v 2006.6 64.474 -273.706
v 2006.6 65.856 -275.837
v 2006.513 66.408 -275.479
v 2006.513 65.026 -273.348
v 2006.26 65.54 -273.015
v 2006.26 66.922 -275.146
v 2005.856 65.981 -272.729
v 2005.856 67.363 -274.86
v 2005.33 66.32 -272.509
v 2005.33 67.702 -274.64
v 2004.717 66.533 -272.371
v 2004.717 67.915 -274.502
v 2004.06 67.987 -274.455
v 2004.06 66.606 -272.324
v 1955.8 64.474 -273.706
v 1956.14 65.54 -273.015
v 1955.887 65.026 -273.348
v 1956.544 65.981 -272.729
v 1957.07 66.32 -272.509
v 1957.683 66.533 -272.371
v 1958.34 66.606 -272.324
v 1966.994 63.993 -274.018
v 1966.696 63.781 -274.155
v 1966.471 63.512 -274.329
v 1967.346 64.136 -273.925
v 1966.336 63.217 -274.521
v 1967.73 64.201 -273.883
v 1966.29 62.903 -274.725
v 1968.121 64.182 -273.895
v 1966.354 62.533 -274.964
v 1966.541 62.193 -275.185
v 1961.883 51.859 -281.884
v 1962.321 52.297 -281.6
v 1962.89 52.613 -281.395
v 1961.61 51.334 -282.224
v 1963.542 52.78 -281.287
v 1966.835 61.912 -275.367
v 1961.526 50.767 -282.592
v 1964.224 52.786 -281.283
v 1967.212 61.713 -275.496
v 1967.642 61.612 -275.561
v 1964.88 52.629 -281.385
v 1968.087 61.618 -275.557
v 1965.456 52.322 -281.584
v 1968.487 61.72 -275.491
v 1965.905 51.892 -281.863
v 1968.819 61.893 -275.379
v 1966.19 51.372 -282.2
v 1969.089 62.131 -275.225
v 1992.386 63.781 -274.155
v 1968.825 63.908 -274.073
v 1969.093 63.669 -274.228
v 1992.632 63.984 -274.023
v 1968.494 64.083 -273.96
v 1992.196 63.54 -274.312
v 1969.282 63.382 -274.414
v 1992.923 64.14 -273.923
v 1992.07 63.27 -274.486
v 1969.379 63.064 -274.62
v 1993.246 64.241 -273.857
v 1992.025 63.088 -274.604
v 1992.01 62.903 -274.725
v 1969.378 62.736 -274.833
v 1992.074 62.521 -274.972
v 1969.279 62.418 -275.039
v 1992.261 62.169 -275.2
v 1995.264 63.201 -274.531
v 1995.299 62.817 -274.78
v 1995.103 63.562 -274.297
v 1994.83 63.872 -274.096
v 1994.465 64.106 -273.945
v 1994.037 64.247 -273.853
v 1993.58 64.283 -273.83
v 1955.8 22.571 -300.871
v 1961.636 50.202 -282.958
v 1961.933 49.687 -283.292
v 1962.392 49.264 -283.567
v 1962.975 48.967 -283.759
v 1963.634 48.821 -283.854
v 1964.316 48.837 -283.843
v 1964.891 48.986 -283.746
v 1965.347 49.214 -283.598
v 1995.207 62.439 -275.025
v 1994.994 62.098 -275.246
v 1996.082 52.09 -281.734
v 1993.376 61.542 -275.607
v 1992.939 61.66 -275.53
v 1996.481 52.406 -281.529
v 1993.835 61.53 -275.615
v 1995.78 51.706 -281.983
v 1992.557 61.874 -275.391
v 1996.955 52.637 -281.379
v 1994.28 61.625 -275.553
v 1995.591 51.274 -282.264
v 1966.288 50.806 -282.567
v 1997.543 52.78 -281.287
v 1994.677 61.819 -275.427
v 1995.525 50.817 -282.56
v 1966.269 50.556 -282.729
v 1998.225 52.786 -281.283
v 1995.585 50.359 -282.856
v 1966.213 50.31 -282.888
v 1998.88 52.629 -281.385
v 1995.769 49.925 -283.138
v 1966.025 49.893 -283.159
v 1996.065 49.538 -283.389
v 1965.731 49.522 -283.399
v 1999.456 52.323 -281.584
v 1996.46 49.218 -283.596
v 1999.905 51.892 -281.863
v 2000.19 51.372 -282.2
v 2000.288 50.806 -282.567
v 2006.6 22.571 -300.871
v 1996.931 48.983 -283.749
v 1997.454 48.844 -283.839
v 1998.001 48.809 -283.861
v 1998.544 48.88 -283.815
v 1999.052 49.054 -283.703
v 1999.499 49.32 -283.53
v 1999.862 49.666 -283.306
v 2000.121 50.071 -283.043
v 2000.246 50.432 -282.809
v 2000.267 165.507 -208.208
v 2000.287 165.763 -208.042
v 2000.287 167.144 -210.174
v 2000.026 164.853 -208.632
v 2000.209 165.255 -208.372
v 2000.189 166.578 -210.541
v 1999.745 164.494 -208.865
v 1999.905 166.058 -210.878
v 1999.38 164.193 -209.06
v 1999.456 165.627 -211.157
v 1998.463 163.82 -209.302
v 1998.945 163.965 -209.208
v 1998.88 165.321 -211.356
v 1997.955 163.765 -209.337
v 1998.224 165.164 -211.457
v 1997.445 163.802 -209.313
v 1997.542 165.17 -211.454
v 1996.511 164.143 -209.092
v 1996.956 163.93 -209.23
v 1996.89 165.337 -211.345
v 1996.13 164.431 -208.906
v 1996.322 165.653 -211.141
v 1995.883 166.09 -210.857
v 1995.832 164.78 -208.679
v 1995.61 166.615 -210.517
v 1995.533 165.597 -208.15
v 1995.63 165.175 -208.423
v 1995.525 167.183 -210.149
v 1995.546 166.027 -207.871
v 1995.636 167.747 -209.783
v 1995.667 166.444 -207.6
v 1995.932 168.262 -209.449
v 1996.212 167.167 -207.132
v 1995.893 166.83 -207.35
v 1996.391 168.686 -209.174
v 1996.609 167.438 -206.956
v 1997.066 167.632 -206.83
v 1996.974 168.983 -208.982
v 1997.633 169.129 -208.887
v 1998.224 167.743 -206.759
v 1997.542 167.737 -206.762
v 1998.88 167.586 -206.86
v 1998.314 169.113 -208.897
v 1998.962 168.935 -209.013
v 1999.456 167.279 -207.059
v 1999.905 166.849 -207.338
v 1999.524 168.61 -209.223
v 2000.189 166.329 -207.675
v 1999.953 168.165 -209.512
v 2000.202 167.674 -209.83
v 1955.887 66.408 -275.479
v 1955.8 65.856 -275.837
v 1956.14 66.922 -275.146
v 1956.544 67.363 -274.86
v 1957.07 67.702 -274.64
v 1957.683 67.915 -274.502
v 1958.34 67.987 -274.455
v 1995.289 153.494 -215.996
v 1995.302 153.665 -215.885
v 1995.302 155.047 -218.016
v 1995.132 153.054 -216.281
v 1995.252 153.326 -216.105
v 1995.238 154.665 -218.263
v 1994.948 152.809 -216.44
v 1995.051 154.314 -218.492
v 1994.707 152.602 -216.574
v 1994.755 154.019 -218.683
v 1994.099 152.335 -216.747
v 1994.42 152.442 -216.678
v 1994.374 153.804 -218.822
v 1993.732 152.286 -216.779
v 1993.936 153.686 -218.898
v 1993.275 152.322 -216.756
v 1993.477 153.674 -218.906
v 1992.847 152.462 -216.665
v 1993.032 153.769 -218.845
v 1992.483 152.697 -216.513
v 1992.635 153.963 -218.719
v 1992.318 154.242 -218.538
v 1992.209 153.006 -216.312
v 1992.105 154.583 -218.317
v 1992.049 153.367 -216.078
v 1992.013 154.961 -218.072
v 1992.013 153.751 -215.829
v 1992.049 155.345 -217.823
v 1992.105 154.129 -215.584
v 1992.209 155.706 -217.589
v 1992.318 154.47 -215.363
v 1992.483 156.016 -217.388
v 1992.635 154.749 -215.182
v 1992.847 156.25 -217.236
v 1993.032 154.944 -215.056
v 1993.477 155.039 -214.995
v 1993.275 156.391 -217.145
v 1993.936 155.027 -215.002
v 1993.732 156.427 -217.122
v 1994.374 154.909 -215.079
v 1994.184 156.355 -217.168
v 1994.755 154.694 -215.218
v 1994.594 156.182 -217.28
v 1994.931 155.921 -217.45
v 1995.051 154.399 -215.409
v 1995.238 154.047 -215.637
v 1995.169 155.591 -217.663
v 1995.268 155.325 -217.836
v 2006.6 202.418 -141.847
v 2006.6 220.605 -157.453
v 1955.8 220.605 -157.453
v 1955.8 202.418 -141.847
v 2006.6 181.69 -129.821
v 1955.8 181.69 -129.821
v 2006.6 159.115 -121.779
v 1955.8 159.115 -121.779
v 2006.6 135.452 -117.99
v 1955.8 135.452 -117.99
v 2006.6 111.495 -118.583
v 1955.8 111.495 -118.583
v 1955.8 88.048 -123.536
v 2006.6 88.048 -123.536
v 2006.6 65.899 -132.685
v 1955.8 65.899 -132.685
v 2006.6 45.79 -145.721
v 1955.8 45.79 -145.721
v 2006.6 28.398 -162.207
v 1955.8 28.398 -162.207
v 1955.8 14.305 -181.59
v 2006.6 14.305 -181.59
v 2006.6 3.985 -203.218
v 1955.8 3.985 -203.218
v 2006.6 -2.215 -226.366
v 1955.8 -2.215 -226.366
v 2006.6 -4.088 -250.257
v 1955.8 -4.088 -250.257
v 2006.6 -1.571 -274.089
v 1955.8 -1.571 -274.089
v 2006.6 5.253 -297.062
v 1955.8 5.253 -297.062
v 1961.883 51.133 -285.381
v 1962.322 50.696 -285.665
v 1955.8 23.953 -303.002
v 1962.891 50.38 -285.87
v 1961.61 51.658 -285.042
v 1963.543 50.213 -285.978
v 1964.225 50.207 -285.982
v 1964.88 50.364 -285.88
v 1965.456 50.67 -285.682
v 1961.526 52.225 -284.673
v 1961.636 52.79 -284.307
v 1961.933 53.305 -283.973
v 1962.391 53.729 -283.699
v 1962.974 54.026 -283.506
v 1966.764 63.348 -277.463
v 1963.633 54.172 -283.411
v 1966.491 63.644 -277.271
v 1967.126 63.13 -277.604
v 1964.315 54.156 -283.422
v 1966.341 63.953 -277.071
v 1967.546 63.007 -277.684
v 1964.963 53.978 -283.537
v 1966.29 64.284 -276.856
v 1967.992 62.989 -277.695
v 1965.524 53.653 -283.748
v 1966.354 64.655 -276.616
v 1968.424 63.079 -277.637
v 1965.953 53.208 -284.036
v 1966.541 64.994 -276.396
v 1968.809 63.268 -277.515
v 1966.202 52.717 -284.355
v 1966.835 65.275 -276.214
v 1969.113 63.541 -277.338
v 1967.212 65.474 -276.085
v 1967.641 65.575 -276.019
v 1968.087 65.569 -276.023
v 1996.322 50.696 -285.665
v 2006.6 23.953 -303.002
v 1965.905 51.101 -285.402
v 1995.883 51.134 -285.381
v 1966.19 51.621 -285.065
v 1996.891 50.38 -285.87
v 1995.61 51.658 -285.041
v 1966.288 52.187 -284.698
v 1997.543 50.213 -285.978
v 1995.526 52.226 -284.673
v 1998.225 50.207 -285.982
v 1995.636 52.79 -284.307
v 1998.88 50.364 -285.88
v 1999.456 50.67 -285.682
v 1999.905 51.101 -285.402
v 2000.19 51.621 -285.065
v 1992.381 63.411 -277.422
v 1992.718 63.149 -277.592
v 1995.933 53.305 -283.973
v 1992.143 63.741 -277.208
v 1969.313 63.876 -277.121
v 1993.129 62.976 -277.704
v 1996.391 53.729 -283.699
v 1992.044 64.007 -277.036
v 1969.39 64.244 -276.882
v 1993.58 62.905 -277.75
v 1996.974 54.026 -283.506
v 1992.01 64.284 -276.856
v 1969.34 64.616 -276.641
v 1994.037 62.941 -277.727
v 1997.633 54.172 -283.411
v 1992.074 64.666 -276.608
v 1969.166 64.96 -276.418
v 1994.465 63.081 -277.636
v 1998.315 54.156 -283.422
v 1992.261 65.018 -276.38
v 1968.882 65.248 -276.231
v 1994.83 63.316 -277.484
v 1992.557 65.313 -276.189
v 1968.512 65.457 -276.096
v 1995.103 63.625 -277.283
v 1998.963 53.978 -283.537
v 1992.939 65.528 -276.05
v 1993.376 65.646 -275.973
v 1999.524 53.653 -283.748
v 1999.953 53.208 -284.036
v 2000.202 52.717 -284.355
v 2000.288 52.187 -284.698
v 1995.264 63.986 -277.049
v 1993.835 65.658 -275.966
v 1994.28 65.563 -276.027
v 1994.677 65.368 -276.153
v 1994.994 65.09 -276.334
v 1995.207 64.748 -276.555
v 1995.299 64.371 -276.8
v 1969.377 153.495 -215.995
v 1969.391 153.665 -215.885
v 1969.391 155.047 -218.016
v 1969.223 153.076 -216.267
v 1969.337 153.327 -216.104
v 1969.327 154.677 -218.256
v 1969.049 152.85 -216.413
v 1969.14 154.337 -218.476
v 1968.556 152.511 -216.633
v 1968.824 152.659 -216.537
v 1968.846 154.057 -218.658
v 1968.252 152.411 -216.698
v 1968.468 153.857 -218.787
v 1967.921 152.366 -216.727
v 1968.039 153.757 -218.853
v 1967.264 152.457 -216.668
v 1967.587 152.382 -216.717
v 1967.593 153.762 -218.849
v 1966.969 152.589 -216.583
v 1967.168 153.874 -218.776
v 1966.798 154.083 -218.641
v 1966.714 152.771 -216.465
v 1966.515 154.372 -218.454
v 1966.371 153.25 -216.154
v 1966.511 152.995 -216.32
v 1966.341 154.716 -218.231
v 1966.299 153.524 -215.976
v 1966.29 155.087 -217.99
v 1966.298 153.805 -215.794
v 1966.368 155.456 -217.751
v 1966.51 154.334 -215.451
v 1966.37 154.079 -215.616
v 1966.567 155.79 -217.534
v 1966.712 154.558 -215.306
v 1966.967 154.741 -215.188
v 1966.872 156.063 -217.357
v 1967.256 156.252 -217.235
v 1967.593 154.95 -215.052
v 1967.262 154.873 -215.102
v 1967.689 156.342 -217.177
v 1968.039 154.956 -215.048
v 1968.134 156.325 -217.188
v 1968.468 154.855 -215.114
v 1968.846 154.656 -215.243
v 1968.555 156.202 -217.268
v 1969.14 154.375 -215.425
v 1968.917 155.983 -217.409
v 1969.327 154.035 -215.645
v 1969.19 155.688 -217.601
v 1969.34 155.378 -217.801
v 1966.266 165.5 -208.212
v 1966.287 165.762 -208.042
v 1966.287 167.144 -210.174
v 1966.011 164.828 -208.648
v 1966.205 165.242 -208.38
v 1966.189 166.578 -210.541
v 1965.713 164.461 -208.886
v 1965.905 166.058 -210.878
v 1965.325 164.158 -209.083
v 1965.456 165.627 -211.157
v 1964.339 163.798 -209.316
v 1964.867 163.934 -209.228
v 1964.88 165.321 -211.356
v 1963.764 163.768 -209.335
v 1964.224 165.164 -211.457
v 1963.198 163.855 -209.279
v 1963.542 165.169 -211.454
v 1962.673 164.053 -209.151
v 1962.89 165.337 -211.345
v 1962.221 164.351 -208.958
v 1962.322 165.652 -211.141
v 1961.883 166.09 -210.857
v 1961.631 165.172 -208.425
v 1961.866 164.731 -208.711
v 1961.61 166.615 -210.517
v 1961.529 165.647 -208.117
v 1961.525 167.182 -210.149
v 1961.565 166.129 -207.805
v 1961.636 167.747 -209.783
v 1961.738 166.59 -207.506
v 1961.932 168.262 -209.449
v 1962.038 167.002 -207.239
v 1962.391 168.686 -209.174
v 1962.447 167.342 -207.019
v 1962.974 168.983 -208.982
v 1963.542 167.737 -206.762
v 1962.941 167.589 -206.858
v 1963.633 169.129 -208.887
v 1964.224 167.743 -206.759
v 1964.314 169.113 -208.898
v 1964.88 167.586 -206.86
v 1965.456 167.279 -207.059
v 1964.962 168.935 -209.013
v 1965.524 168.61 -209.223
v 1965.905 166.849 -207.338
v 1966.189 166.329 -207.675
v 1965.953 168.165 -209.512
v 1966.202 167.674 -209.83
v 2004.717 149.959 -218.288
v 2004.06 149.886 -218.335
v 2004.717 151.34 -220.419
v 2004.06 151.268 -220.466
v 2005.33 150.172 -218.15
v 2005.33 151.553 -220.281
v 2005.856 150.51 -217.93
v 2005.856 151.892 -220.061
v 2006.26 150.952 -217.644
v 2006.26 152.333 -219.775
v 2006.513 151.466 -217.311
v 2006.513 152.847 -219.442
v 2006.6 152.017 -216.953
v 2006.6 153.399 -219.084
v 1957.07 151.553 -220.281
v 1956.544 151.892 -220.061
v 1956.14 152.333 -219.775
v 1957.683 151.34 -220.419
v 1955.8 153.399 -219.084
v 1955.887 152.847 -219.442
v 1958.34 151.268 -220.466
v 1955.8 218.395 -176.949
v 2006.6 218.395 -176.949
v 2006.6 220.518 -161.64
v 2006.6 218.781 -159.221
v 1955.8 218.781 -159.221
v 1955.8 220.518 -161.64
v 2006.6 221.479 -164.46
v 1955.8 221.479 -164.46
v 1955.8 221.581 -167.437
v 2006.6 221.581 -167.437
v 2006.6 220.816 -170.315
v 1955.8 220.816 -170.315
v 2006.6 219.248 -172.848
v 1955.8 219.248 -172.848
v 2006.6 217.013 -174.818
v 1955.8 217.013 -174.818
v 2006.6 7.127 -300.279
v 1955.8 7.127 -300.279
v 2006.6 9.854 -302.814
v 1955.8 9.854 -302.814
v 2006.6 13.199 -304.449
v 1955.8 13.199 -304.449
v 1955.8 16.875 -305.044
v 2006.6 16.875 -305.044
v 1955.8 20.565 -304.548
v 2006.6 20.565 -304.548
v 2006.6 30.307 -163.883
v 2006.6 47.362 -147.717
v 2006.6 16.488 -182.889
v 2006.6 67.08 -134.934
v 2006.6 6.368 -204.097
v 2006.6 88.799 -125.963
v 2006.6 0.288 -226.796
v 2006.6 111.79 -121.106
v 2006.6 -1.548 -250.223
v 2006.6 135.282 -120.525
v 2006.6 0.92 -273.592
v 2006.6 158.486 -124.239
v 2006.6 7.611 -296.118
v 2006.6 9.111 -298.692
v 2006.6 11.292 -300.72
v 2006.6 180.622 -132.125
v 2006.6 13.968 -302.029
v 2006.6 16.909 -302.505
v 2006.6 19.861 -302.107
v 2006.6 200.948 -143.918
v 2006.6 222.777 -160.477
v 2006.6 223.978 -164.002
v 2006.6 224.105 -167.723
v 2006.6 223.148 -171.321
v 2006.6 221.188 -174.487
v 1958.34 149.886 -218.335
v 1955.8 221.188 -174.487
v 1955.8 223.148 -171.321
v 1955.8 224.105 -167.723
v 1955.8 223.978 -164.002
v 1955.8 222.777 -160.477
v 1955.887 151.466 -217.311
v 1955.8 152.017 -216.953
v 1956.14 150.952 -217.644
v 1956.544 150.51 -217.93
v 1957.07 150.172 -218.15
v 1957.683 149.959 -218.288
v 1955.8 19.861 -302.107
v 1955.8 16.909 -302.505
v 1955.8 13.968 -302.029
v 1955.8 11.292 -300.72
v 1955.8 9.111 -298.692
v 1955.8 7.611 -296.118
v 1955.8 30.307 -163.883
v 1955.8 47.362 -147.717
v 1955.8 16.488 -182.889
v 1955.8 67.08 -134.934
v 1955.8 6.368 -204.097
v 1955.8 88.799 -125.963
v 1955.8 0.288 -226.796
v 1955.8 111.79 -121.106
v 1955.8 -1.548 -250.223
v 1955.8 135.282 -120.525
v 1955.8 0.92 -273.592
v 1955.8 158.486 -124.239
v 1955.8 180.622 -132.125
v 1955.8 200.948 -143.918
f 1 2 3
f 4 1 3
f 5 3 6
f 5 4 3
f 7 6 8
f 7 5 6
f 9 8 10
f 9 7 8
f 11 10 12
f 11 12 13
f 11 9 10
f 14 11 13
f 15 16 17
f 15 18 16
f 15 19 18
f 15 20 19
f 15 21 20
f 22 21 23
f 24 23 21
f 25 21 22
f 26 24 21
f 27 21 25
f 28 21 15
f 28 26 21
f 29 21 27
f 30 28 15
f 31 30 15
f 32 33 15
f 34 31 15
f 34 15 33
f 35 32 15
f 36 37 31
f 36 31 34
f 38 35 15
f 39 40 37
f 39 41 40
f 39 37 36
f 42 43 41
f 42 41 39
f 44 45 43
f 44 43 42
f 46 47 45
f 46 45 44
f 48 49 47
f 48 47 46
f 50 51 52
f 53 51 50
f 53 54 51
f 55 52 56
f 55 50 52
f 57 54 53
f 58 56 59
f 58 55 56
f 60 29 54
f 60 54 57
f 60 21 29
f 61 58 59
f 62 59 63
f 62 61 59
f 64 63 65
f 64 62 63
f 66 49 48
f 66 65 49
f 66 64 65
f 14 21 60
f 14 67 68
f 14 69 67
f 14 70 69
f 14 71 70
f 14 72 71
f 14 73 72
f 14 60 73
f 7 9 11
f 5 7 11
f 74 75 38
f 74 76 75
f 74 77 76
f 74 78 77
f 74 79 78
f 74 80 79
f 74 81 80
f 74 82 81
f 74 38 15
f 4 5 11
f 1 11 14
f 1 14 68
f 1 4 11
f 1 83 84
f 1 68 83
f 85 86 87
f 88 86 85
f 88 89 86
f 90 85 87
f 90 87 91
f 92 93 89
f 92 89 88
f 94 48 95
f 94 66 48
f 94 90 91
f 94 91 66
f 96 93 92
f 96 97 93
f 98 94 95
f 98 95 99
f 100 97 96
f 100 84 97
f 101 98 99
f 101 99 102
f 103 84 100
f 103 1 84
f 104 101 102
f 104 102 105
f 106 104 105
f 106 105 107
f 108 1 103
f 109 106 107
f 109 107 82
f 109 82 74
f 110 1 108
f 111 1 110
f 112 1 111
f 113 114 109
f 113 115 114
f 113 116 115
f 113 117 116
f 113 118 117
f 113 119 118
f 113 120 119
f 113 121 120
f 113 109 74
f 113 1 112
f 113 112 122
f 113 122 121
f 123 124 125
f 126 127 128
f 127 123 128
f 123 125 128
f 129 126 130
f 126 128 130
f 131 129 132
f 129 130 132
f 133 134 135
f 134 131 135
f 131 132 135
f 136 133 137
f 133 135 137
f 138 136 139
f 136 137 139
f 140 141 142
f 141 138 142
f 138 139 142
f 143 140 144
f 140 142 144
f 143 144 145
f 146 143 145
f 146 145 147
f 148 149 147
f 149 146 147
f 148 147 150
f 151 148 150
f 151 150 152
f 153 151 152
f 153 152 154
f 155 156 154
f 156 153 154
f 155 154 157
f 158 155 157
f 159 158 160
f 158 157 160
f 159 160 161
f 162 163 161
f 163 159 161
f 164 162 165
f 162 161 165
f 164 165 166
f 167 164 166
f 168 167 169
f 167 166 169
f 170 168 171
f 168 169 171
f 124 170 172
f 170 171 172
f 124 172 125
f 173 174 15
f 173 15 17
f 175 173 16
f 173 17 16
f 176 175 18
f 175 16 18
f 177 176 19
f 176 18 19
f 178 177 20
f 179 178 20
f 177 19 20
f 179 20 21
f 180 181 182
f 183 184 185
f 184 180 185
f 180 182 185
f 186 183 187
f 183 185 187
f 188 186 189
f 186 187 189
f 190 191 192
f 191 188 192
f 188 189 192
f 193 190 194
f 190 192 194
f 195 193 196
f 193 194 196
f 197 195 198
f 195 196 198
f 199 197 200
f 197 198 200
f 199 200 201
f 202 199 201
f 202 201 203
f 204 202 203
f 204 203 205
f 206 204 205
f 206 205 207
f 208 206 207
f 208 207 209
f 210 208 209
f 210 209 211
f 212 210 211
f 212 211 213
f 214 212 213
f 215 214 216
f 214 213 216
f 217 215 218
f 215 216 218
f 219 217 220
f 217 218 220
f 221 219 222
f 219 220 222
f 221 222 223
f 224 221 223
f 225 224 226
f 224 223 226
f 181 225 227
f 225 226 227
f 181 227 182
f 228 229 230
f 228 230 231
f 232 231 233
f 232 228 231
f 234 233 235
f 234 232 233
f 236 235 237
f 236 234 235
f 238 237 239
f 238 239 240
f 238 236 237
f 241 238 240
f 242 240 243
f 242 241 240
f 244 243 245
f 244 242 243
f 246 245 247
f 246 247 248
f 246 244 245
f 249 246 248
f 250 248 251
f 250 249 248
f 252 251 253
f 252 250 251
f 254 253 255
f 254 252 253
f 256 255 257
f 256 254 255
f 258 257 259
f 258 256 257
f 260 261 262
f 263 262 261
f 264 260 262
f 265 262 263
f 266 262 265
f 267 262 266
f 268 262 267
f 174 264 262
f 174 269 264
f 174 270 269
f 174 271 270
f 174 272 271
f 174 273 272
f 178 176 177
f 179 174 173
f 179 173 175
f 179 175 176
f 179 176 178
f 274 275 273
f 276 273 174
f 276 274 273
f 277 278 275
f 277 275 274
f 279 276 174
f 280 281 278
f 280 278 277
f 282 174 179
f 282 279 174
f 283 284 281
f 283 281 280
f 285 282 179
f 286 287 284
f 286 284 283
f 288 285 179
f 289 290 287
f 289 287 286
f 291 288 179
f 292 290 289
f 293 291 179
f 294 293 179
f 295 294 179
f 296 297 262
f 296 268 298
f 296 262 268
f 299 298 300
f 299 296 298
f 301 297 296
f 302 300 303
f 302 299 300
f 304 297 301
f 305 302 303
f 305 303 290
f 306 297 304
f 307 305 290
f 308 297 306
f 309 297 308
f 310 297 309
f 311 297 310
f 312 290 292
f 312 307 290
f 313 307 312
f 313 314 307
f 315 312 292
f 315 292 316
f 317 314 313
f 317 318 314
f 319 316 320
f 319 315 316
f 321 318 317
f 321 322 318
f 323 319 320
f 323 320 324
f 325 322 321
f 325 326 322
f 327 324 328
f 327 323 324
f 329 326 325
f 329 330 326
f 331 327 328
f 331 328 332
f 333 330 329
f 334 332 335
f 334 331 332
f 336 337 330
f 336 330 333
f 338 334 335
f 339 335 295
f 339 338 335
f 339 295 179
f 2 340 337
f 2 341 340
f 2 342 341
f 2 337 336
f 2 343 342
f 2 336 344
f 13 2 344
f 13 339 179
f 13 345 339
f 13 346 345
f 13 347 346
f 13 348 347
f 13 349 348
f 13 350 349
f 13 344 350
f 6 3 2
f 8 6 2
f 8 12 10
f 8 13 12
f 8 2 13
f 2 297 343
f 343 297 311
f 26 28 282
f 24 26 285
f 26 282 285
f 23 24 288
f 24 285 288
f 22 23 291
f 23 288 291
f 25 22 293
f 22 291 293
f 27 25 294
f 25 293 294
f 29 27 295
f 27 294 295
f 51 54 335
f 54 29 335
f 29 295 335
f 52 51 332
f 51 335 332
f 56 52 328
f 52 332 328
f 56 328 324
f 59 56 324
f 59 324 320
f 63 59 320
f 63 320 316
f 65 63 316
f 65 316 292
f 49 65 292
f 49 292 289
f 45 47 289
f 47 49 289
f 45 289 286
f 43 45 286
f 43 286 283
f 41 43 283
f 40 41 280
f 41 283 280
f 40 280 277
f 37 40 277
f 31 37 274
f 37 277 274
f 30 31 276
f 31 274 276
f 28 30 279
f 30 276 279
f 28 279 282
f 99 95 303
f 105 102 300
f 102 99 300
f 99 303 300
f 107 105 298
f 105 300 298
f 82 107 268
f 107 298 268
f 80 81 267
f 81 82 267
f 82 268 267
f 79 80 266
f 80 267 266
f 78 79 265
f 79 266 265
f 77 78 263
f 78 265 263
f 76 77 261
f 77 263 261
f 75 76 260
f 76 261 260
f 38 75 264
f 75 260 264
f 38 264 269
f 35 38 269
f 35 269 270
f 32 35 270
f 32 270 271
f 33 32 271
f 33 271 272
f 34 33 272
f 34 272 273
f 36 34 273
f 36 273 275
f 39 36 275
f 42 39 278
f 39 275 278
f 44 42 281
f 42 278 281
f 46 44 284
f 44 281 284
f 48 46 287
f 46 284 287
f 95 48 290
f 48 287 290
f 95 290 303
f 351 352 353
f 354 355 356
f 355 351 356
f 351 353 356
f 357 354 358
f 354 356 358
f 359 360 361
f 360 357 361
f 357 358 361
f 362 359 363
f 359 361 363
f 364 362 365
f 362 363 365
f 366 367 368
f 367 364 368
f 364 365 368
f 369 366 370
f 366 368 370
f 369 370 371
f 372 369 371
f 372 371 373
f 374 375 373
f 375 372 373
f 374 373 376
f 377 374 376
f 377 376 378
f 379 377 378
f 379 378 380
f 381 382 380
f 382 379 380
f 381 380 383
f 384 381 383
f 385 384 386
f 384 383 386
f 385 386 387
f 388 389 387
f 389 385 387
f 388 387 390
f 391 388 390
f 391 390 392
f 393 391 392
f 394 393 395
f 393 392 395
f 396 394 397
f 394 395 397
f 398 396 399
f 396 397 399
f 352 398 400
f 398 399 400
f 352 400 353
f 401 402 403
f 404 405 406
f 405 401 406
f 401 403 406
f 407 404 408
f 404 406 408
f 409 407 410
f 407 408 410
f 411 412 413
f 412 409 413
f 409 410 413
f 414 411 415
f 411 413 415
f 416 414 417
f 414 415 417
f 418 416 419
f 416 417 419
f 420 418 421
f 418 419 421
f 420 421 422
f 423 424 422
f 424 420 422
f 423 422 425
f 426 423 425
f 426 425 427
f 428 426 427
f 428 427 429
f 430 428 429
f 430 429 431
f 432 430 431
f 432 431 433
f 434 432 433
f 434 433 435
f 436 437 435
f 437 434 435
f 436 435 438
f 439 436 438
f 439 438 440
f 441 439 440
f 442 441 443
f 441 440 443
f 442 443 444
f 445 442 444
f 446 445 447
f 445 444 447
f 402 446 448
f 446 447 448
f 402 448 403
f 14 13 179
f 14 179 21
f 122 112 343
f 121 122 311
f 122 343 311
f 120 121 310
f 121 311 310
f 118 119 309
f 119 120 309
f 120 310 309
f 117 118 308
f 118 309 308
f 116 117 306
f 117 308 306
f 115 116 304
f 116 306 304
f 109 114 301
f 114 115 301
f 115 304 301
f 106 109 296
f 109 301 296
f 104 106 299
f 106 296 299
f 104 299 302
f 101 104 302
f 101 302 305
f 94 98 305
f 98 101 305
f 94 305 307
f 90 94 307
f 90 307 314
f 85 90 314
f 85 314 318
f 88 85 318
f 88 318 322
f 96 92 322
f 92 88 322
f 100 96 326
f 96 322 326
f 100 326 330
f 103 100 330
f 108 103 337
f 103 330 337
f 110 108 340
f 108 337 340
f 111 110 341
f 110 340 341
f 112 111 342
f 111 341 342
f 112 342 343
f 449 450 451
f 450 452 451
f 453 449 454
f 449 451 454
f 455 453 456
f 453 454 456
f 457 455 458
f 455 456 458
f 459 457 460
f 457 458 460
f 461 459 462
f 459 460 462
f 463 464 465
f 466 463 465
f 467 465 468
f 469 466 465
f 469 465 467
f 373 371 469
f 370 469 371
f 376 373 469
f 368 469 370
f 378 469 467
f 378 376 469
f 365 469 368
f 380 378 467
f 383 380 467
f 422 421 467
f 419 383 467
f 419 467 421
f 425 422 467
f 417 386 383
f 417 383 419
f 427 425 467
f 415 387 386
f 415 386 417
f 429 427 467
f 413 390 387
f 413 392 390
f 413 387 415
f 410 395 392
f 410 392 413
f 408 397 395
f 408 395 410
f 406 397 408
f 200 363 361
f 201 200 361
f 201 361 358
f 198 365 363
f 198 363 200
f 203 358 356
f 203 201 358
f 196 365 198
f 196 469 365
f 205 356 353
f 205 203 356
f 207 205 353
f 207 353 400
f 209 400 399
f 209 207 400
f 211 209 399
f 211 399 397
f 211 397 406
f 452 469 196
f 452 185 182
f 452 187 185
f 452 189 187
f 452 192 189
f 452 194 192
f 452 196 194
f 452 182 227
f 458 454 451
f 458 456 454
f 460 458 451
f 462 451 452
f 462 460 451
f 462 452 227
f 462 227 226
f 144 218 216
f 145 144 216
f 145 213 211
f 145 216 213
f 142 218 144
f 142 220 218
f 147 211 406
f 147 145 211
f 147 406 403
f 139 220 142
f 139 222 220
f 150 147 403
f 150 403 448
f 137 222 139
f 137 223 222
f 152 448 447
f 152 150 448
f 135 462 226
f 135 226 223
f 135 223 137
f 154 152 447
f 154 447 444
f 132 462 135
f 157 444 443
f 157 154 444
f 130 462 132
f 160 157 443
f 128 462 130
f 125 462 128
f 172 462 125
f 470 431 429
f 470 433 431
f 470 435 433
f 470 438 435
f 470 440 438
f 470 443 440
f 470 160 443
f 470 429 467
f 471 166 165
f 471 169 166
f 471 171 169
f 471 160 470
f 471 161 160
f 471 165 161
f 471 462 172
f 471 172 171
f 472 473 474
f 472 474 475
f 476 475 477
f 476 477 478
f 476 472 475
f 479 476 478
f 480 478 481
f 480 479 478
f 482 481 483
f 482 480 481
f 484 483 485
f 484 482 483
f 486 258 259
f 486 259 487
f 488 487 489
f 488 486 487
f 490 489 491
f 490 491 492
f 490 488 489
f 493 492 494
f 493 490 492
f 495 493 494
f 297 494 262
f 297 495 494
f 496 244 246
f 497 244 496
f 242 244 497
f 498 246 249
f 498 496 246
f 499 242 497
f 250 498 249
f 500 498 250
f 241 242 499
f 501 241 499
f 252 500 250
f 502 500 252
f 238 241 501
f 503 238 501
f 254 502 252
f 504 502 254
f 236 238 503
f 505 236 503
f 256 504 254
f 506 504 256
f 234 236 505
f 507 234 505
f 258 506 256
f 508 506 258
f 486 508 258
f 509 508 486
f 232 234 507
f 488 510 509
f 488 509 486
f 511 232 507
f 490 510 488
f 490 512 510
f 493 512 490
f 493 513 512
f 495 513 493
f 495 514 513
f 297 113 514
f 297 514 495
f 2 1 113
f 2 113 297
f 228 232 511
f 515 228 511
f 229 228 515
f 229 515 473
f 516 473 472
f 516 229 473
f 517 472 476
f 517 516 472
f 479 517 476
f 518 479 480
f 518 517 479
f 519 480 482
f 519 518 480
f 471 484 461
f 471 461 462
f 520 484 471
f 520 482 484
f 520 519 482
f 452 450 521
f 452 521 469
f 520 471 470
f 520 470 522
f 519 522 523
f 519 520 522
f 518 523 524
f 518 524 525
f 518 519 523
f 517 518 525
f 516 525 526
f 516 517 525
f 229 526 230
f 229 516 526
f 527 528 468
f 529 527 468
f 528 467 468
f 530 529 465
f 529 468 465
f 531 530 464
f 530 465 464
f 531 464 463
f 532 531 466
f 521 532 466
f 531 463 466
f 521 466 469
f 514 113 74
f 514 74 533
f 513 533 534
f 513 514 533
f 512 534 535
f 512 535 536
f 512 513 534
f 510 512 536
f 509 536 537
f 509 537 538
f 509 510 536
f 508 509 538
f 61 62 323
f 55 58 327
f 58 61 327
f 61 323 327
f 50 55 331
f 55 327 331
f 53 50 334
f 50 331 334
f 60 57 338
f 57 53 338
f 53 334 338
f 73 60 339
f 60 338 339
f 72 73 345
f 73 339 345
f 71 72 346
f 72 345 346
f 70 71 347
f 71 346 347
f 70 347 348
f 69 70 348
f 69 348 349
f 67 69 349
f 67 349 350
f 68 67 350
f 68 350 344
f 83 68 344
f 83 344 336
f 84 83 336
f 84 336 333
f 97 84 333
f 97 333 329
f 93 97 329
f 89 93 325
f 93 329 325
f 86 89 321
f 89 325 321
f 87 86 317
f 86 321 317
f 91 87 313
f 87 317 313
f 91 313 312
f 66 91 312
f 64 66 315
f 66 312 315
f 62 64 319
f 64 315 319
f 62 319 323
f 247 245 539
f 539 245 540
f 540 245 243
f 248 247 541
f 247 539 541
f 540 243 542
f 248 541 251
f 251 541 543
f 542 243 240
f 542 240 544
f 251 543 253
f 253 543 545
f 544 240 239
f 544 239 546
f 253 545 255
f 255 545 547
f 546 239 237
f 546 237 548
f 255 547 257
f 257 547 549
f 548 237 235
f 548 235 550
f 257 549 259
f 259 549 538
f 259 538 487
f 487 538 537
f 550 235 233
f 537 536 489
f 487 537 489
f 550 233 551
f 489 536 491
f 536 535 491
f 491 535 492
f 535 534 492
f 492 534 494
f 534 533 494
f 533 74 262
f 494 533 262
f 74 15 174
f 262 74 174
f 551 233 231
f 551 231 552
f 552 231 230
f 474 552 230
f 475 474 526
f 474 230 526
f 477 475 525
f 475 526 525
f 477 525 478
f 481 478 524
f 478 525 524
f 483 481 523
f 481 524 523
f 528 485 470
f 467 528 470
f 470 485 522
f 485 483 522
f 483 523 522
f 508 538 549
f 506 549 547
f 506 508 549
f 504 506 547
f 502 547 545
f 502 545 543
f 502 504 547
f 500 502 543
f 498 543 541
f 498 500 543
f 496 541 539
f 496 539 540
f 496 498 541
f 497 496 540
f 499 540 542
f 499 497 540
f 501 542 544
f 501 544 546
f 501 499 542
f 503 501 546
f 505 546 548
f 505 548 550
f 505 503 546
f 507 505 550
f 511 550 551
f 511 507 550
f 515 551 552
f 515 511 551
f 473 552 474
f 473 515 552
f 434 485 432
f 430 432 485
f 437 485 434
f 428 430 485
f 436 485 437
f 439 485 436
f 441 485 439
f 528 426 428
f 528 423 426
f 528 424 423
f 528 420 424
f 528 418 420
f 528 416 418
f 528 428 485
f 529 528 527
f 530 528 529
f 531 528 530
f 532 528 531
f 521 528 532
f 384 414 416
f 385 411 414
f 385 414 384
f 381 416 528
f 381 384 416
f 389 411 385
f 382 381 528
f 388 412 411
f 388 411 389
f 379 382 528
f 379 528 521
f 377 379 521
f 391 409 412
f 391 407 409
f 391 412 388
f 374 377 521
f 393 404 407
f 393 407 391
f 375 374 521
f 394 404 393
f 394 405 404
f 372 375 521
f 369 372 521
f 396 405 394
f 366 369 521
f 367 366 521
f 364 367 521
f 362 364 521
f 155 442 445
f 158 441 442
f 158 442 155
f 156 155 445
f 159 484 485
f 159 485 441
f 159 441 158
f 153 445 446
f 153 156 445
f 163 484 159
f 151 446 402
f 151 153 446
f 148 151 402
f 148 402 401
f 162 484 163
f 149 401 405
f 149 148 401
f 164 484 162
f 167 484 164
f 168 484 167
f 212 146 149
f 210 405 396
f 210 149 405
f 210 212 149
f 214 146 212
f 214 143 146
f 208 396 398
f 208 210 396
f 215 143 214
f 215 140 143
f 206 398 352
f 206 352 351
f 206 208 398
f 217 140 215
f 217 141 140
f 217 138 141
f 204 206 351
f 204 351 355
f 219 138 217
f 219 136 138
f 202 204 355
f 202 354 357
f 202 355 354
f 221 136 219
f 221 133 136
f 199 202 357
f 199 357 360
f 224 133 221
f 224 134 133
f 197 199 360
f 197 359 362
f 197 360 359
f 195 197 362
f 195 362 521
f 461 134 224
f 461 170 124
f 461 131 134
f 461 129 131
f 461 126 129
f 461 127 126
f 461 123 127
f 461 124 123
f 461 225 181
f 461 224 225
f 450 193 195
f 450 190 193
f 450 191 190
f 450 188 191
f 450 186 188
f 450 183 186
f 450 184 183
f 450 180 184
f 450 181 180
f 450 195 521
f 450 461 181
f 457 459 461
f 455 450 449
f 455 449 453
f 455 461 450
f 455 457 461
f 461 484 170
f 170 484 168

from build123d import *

# Parameters (mm, degrees)
EXTRUDE_THIN1_DEPTH = 25.4
CUT_EXTRUDE1_REACH  = 172.75
SKETCH5_RX          = 2.38125
SKETCH5_RY          = 2.381249971
SKETCH5_RX_2        = 1.550642295
SKETCH5_RY_2        = 1.550642276
SKETCH5_RX_3        = 1.646158252
SKETCH5_RY_3        = 1.646158232
FILLET1_R           = 2.54


with BuildPart() as part:
    # Sketch2 → Extrude-Thin1 (new body, symmetric)
    with BuildSketch(Plane(origin=(1981.2, 0, 0), x_dir=(0, 0, -1), z_dir=(1, 0, 0))):
        with BuildLine():
            Line((220.466063539, 151.267804305), (176.948936788, 218.39459013))
            ThreePointArc((176.948936788, 218.39459013), (167.722867176, 224.105285456), (157.452600901, 220.60470947))
            ThreePointArc((157.452600901, 220.60470947), (138.741359143, 55.545453365), (297.061605662, 5.252629462))
            ThreePointArc((297.061605662, 5.252629462), (304.44942683, 13.199484184), (303.002052812, 23.952972457))
            Line((303.002052812, 23.952972457), (274.455306754, 67.987389518))
            Line((274.455306754, 67.987389518), (272.32398896, 66.605693293))
            Line((272.32398896, 66.605693293), (300.870735018, 22.571276232))
            ThreePointArc((300.870735018, 22.571276232), (302.028634232, 13.968485614), (296.118377298, 7.611001836))
            ThreePointArc((296.118377298, 7.611001836), (140.872676937, 56.927149591), (159.220550284, 218.780989377))
            ThreePointArc((159.220550284, 218.780989377), (167.436763304, 221.581450166), (174.817618993, 217.012893905))
            Line((174.817618993, 217.012893905), (218.334745745, 149.88610808))
            Line((218.334745745, 149.88610808), (220.466063539, 151.267804305))
        make_face()
    extrude(amount=EXTRUDE_THIN1_DEPTH, both=True)

    # Sketch5 → Cut-Extrude1 (cut, up to next)
    with BuildSketch(Plane(origin=(0, 145.393223301, -224.274452143), x_dir=(-1, 0, 0), z_dir=(0, 0.543974892, -0.839101494)), mode=Mode.PRIVATE) as cut_extrude1_sk1:
        with Locations(Location((-1997.906331803, -111.078184062), (0, 0, 180))):
            Ellipse(SKETCH5_RX, SKETCH5_RY)
    cut_extrude1_tool1 = extrude(cut_extrude1_sk1.sketch, amount=-CUT_EXTRUDE1_REACH, mode=Mode.PRIVATE) & part.part
    add(cut_extrude1_tool1.solids().sort_by_distance((1997.906332, 52.187353, -284.698195))[0], mode=Mode.SUBTRACT)
    # Sketch5 → Cut-Extrude1 (cut, up to next)
    with BuildSketch(Plane(origin=(0, 145.393223301, -224.274452143), x_dir=(-1, 0, 0), z_dir=(0, 0.543974892, -0.839101494)), mode=Mode.PRIVATE) as cut_extrude1_sk2:
        with Locations(Location((-1963.906331803, -111.078300707), (0, 0, 180))):
            Ellipse(SKETCH5_RX, SKETCH5_RY)
    cut_extrude1_tool2 = extrude(cut_extrude1_sk2.sketch, amount=-CUT_EXTRUDE1_REACH, mode=Mode.PRIVATE) & part.part
    add(cut_extrude1_tool2.solids().sort_by_distance((1963.906332, 52.187255, -284.698259))[0], mode=Mode.SUBTRACT)
    # Sketch5 → Cut-Extrude1 (cut, up to next)
    with BuildSketch(Plane(origin=(0, 145.393223301, -224.274452143), x_dir=(-1, 0, 0), z_dir=(0, 0.543974892, -0.839101494)), mode=Mode.PRIVATE) as cut_extrude1_sk3:
        with Locations(Location((-1967.840481597, -96.661495239), (0, 0, 0))):
            Ellipse(SKETCH5_RX_2, SKETCH5_RY_2)
    cut_extrude1_tool3 = extrude(cut_extrude1_sk3.sketch, amount=-CUT_EXTRUDE1_REACH, mode=Mode.PRIVATE) & part.part
    add(cut_extrude1_tool3.solids().sort_by_distance((1967.840482, 64.284418, -276.855879))[0], mode=Mode.SUBTRACT)
    # Sketch5 → Cut-Extrude1 (cut, up to next)
    with BuildSketch(Plane(origin=(0, 145.393223301, -224.274452143), x_dir=(-1, 0, 0), z_dir=(0, 0.543974892, -0.839101494)), mode=Mode.PRIVATE) as cut_extrude1_sk4:
        with Locations(Location((-1993.656290613, -96.661406671), (0, 0, 0))):
            Ellipse(SKETCH5_RX_3, SKETCH5_RY_3)
    cut_extrude1_tool4 = extrude(cut_extrude1_sk4.sketch, amount=-CUT_EXTRUDE1_REACH, mode=Mode.PRIVATE) & part.part
    add(cut_extrude1_tool4.solids().sort_by_distance((1993.656291, 64.284493, -276.85583))[0], mode=Mode.SUBTRACT)
    # Sketch5 → Cut-Extrude1 (cut, up to next)
    with BuildSketch(Plane(origin=(0, 145.393223301, -224.274452143), x_dir=(-1, 0, 0), z_dir=(0, 0.543974892, -0.839101494)), mode=Mode.PRIVATE) as cut_extrude1_sk5:
        with Locations(Location((-1967.840110504, 11.504920485), (0, 0, 180))):
            Ellipse(SKETCH5_RX_2, SKETCH5_RY_2)
    cut_extrude1_tool5 = extrude(cut_extrude1_sk5.sketch, amount=-CUT_EXTRUDE1_REACH, mode=Mode.PRIVATE) & part.part
    add(cut_extrude1_tool5.solids().sort_by_distance((1967.840111, 155.047019, -218.016064))[0], mode=Mode.SUBTRACT)
    # Sketch5 → Cut-Extrude1 (cut, up to next)
    with BuildSketch(Plane(origin=(0, 145.393223301, -224.274452143), x_dir=(-1, 0, 0), z_dir=(0, 0.543974892, -0.839101494)), mode=Mode.PRIVATE) as cut_extrude1_sk6:
        with Locations(Location((-1993.655919521, 11.505009053), (0, 0, 180))):
            Ellipse(SKETCH5_RX_3, SKETCH5_RY_3)
    cut_extrude1_tool6 = extrude(cut_extrude1_sk6.sketch, amount=-CUT_EXTRUDE1_REACH, mode=Mode.PRIVATE) & part.part
    add(cut_extrude1_tool6.solids().sort_by_distance((1993.65592, 155.047094, -218.016016))[0], mode=Mode.SUBTRACT)
    # Sketch5 → Cut-Extrude1 (cut, up to next)
    with BuildSketch(Plane(origin=(0, 145.393223301, -224.274452143), x_dir=(-1, 0, 0), z_dir=(0, 0.543974892, -0.839101494)), mode=Mode.PRIVATE) as cut_extrude1_sk7:
        with Locations(Location((-1963.90586179, 25.921697621), (0, 0, 180))):
            Ellipse(SKETCH5_RX, SKETCH5_RY)
    cut_extrude1_tool7 = extrude(cut_extrude1_sk7.sketch, amount=-CUT_EXTRUDE1_REACH, mode=Mode.PRIVATE) & part.part
    add(cut_extrude1_tool7.solids().sort_by_distance((1963.905862, 167.144158, -210.173699))[0], mode=Mode.SUBTRACT)
    # Sketch5 → Cut-Extrude1 (cut, up to next)
    with BuildSketch(Plane(origin=(0, 145.393223301, -224.274452143), x_dir=(-1, 0, 0), z_dir=(0, 0.543974892, -0.839101494)), mode=Mode.PRIVATE) as cut_extrude1_sk8:
        with Locations(Location((-1997.90586179, 25.921814267), (0, 0, 180))):
            Ellipse(SKETCH5_RX, SKETCH5_RY)
    cut_extrude1_tool8 = extrude(cut_extrude1_sk8.sketch, amount=-CUT_EXTRUDE1_REACH, mode=Mode.PRIVATE) & part.part
    add(cut_extrude1_tool8.solids().sort_by_distance((1997.905862, 167.144256, -210.173636))[0], mode=Mode.SUBTRACT)

    # Fillet1
    fillet1_edges = [part.edges().sort_by_distance(p)[0] for p in [
        (1955.8, 67.296541405, -273.389647857),
        (1955.8, 150.576956192, -219.400404642),
        (2006.6, 67.296541405, -273.389647857),
        (2006.6, 150.576956192, -219.400404642),
    ]]
    fillet(fillet1_edges, radius=FILLET1_R)


solid = part.part
